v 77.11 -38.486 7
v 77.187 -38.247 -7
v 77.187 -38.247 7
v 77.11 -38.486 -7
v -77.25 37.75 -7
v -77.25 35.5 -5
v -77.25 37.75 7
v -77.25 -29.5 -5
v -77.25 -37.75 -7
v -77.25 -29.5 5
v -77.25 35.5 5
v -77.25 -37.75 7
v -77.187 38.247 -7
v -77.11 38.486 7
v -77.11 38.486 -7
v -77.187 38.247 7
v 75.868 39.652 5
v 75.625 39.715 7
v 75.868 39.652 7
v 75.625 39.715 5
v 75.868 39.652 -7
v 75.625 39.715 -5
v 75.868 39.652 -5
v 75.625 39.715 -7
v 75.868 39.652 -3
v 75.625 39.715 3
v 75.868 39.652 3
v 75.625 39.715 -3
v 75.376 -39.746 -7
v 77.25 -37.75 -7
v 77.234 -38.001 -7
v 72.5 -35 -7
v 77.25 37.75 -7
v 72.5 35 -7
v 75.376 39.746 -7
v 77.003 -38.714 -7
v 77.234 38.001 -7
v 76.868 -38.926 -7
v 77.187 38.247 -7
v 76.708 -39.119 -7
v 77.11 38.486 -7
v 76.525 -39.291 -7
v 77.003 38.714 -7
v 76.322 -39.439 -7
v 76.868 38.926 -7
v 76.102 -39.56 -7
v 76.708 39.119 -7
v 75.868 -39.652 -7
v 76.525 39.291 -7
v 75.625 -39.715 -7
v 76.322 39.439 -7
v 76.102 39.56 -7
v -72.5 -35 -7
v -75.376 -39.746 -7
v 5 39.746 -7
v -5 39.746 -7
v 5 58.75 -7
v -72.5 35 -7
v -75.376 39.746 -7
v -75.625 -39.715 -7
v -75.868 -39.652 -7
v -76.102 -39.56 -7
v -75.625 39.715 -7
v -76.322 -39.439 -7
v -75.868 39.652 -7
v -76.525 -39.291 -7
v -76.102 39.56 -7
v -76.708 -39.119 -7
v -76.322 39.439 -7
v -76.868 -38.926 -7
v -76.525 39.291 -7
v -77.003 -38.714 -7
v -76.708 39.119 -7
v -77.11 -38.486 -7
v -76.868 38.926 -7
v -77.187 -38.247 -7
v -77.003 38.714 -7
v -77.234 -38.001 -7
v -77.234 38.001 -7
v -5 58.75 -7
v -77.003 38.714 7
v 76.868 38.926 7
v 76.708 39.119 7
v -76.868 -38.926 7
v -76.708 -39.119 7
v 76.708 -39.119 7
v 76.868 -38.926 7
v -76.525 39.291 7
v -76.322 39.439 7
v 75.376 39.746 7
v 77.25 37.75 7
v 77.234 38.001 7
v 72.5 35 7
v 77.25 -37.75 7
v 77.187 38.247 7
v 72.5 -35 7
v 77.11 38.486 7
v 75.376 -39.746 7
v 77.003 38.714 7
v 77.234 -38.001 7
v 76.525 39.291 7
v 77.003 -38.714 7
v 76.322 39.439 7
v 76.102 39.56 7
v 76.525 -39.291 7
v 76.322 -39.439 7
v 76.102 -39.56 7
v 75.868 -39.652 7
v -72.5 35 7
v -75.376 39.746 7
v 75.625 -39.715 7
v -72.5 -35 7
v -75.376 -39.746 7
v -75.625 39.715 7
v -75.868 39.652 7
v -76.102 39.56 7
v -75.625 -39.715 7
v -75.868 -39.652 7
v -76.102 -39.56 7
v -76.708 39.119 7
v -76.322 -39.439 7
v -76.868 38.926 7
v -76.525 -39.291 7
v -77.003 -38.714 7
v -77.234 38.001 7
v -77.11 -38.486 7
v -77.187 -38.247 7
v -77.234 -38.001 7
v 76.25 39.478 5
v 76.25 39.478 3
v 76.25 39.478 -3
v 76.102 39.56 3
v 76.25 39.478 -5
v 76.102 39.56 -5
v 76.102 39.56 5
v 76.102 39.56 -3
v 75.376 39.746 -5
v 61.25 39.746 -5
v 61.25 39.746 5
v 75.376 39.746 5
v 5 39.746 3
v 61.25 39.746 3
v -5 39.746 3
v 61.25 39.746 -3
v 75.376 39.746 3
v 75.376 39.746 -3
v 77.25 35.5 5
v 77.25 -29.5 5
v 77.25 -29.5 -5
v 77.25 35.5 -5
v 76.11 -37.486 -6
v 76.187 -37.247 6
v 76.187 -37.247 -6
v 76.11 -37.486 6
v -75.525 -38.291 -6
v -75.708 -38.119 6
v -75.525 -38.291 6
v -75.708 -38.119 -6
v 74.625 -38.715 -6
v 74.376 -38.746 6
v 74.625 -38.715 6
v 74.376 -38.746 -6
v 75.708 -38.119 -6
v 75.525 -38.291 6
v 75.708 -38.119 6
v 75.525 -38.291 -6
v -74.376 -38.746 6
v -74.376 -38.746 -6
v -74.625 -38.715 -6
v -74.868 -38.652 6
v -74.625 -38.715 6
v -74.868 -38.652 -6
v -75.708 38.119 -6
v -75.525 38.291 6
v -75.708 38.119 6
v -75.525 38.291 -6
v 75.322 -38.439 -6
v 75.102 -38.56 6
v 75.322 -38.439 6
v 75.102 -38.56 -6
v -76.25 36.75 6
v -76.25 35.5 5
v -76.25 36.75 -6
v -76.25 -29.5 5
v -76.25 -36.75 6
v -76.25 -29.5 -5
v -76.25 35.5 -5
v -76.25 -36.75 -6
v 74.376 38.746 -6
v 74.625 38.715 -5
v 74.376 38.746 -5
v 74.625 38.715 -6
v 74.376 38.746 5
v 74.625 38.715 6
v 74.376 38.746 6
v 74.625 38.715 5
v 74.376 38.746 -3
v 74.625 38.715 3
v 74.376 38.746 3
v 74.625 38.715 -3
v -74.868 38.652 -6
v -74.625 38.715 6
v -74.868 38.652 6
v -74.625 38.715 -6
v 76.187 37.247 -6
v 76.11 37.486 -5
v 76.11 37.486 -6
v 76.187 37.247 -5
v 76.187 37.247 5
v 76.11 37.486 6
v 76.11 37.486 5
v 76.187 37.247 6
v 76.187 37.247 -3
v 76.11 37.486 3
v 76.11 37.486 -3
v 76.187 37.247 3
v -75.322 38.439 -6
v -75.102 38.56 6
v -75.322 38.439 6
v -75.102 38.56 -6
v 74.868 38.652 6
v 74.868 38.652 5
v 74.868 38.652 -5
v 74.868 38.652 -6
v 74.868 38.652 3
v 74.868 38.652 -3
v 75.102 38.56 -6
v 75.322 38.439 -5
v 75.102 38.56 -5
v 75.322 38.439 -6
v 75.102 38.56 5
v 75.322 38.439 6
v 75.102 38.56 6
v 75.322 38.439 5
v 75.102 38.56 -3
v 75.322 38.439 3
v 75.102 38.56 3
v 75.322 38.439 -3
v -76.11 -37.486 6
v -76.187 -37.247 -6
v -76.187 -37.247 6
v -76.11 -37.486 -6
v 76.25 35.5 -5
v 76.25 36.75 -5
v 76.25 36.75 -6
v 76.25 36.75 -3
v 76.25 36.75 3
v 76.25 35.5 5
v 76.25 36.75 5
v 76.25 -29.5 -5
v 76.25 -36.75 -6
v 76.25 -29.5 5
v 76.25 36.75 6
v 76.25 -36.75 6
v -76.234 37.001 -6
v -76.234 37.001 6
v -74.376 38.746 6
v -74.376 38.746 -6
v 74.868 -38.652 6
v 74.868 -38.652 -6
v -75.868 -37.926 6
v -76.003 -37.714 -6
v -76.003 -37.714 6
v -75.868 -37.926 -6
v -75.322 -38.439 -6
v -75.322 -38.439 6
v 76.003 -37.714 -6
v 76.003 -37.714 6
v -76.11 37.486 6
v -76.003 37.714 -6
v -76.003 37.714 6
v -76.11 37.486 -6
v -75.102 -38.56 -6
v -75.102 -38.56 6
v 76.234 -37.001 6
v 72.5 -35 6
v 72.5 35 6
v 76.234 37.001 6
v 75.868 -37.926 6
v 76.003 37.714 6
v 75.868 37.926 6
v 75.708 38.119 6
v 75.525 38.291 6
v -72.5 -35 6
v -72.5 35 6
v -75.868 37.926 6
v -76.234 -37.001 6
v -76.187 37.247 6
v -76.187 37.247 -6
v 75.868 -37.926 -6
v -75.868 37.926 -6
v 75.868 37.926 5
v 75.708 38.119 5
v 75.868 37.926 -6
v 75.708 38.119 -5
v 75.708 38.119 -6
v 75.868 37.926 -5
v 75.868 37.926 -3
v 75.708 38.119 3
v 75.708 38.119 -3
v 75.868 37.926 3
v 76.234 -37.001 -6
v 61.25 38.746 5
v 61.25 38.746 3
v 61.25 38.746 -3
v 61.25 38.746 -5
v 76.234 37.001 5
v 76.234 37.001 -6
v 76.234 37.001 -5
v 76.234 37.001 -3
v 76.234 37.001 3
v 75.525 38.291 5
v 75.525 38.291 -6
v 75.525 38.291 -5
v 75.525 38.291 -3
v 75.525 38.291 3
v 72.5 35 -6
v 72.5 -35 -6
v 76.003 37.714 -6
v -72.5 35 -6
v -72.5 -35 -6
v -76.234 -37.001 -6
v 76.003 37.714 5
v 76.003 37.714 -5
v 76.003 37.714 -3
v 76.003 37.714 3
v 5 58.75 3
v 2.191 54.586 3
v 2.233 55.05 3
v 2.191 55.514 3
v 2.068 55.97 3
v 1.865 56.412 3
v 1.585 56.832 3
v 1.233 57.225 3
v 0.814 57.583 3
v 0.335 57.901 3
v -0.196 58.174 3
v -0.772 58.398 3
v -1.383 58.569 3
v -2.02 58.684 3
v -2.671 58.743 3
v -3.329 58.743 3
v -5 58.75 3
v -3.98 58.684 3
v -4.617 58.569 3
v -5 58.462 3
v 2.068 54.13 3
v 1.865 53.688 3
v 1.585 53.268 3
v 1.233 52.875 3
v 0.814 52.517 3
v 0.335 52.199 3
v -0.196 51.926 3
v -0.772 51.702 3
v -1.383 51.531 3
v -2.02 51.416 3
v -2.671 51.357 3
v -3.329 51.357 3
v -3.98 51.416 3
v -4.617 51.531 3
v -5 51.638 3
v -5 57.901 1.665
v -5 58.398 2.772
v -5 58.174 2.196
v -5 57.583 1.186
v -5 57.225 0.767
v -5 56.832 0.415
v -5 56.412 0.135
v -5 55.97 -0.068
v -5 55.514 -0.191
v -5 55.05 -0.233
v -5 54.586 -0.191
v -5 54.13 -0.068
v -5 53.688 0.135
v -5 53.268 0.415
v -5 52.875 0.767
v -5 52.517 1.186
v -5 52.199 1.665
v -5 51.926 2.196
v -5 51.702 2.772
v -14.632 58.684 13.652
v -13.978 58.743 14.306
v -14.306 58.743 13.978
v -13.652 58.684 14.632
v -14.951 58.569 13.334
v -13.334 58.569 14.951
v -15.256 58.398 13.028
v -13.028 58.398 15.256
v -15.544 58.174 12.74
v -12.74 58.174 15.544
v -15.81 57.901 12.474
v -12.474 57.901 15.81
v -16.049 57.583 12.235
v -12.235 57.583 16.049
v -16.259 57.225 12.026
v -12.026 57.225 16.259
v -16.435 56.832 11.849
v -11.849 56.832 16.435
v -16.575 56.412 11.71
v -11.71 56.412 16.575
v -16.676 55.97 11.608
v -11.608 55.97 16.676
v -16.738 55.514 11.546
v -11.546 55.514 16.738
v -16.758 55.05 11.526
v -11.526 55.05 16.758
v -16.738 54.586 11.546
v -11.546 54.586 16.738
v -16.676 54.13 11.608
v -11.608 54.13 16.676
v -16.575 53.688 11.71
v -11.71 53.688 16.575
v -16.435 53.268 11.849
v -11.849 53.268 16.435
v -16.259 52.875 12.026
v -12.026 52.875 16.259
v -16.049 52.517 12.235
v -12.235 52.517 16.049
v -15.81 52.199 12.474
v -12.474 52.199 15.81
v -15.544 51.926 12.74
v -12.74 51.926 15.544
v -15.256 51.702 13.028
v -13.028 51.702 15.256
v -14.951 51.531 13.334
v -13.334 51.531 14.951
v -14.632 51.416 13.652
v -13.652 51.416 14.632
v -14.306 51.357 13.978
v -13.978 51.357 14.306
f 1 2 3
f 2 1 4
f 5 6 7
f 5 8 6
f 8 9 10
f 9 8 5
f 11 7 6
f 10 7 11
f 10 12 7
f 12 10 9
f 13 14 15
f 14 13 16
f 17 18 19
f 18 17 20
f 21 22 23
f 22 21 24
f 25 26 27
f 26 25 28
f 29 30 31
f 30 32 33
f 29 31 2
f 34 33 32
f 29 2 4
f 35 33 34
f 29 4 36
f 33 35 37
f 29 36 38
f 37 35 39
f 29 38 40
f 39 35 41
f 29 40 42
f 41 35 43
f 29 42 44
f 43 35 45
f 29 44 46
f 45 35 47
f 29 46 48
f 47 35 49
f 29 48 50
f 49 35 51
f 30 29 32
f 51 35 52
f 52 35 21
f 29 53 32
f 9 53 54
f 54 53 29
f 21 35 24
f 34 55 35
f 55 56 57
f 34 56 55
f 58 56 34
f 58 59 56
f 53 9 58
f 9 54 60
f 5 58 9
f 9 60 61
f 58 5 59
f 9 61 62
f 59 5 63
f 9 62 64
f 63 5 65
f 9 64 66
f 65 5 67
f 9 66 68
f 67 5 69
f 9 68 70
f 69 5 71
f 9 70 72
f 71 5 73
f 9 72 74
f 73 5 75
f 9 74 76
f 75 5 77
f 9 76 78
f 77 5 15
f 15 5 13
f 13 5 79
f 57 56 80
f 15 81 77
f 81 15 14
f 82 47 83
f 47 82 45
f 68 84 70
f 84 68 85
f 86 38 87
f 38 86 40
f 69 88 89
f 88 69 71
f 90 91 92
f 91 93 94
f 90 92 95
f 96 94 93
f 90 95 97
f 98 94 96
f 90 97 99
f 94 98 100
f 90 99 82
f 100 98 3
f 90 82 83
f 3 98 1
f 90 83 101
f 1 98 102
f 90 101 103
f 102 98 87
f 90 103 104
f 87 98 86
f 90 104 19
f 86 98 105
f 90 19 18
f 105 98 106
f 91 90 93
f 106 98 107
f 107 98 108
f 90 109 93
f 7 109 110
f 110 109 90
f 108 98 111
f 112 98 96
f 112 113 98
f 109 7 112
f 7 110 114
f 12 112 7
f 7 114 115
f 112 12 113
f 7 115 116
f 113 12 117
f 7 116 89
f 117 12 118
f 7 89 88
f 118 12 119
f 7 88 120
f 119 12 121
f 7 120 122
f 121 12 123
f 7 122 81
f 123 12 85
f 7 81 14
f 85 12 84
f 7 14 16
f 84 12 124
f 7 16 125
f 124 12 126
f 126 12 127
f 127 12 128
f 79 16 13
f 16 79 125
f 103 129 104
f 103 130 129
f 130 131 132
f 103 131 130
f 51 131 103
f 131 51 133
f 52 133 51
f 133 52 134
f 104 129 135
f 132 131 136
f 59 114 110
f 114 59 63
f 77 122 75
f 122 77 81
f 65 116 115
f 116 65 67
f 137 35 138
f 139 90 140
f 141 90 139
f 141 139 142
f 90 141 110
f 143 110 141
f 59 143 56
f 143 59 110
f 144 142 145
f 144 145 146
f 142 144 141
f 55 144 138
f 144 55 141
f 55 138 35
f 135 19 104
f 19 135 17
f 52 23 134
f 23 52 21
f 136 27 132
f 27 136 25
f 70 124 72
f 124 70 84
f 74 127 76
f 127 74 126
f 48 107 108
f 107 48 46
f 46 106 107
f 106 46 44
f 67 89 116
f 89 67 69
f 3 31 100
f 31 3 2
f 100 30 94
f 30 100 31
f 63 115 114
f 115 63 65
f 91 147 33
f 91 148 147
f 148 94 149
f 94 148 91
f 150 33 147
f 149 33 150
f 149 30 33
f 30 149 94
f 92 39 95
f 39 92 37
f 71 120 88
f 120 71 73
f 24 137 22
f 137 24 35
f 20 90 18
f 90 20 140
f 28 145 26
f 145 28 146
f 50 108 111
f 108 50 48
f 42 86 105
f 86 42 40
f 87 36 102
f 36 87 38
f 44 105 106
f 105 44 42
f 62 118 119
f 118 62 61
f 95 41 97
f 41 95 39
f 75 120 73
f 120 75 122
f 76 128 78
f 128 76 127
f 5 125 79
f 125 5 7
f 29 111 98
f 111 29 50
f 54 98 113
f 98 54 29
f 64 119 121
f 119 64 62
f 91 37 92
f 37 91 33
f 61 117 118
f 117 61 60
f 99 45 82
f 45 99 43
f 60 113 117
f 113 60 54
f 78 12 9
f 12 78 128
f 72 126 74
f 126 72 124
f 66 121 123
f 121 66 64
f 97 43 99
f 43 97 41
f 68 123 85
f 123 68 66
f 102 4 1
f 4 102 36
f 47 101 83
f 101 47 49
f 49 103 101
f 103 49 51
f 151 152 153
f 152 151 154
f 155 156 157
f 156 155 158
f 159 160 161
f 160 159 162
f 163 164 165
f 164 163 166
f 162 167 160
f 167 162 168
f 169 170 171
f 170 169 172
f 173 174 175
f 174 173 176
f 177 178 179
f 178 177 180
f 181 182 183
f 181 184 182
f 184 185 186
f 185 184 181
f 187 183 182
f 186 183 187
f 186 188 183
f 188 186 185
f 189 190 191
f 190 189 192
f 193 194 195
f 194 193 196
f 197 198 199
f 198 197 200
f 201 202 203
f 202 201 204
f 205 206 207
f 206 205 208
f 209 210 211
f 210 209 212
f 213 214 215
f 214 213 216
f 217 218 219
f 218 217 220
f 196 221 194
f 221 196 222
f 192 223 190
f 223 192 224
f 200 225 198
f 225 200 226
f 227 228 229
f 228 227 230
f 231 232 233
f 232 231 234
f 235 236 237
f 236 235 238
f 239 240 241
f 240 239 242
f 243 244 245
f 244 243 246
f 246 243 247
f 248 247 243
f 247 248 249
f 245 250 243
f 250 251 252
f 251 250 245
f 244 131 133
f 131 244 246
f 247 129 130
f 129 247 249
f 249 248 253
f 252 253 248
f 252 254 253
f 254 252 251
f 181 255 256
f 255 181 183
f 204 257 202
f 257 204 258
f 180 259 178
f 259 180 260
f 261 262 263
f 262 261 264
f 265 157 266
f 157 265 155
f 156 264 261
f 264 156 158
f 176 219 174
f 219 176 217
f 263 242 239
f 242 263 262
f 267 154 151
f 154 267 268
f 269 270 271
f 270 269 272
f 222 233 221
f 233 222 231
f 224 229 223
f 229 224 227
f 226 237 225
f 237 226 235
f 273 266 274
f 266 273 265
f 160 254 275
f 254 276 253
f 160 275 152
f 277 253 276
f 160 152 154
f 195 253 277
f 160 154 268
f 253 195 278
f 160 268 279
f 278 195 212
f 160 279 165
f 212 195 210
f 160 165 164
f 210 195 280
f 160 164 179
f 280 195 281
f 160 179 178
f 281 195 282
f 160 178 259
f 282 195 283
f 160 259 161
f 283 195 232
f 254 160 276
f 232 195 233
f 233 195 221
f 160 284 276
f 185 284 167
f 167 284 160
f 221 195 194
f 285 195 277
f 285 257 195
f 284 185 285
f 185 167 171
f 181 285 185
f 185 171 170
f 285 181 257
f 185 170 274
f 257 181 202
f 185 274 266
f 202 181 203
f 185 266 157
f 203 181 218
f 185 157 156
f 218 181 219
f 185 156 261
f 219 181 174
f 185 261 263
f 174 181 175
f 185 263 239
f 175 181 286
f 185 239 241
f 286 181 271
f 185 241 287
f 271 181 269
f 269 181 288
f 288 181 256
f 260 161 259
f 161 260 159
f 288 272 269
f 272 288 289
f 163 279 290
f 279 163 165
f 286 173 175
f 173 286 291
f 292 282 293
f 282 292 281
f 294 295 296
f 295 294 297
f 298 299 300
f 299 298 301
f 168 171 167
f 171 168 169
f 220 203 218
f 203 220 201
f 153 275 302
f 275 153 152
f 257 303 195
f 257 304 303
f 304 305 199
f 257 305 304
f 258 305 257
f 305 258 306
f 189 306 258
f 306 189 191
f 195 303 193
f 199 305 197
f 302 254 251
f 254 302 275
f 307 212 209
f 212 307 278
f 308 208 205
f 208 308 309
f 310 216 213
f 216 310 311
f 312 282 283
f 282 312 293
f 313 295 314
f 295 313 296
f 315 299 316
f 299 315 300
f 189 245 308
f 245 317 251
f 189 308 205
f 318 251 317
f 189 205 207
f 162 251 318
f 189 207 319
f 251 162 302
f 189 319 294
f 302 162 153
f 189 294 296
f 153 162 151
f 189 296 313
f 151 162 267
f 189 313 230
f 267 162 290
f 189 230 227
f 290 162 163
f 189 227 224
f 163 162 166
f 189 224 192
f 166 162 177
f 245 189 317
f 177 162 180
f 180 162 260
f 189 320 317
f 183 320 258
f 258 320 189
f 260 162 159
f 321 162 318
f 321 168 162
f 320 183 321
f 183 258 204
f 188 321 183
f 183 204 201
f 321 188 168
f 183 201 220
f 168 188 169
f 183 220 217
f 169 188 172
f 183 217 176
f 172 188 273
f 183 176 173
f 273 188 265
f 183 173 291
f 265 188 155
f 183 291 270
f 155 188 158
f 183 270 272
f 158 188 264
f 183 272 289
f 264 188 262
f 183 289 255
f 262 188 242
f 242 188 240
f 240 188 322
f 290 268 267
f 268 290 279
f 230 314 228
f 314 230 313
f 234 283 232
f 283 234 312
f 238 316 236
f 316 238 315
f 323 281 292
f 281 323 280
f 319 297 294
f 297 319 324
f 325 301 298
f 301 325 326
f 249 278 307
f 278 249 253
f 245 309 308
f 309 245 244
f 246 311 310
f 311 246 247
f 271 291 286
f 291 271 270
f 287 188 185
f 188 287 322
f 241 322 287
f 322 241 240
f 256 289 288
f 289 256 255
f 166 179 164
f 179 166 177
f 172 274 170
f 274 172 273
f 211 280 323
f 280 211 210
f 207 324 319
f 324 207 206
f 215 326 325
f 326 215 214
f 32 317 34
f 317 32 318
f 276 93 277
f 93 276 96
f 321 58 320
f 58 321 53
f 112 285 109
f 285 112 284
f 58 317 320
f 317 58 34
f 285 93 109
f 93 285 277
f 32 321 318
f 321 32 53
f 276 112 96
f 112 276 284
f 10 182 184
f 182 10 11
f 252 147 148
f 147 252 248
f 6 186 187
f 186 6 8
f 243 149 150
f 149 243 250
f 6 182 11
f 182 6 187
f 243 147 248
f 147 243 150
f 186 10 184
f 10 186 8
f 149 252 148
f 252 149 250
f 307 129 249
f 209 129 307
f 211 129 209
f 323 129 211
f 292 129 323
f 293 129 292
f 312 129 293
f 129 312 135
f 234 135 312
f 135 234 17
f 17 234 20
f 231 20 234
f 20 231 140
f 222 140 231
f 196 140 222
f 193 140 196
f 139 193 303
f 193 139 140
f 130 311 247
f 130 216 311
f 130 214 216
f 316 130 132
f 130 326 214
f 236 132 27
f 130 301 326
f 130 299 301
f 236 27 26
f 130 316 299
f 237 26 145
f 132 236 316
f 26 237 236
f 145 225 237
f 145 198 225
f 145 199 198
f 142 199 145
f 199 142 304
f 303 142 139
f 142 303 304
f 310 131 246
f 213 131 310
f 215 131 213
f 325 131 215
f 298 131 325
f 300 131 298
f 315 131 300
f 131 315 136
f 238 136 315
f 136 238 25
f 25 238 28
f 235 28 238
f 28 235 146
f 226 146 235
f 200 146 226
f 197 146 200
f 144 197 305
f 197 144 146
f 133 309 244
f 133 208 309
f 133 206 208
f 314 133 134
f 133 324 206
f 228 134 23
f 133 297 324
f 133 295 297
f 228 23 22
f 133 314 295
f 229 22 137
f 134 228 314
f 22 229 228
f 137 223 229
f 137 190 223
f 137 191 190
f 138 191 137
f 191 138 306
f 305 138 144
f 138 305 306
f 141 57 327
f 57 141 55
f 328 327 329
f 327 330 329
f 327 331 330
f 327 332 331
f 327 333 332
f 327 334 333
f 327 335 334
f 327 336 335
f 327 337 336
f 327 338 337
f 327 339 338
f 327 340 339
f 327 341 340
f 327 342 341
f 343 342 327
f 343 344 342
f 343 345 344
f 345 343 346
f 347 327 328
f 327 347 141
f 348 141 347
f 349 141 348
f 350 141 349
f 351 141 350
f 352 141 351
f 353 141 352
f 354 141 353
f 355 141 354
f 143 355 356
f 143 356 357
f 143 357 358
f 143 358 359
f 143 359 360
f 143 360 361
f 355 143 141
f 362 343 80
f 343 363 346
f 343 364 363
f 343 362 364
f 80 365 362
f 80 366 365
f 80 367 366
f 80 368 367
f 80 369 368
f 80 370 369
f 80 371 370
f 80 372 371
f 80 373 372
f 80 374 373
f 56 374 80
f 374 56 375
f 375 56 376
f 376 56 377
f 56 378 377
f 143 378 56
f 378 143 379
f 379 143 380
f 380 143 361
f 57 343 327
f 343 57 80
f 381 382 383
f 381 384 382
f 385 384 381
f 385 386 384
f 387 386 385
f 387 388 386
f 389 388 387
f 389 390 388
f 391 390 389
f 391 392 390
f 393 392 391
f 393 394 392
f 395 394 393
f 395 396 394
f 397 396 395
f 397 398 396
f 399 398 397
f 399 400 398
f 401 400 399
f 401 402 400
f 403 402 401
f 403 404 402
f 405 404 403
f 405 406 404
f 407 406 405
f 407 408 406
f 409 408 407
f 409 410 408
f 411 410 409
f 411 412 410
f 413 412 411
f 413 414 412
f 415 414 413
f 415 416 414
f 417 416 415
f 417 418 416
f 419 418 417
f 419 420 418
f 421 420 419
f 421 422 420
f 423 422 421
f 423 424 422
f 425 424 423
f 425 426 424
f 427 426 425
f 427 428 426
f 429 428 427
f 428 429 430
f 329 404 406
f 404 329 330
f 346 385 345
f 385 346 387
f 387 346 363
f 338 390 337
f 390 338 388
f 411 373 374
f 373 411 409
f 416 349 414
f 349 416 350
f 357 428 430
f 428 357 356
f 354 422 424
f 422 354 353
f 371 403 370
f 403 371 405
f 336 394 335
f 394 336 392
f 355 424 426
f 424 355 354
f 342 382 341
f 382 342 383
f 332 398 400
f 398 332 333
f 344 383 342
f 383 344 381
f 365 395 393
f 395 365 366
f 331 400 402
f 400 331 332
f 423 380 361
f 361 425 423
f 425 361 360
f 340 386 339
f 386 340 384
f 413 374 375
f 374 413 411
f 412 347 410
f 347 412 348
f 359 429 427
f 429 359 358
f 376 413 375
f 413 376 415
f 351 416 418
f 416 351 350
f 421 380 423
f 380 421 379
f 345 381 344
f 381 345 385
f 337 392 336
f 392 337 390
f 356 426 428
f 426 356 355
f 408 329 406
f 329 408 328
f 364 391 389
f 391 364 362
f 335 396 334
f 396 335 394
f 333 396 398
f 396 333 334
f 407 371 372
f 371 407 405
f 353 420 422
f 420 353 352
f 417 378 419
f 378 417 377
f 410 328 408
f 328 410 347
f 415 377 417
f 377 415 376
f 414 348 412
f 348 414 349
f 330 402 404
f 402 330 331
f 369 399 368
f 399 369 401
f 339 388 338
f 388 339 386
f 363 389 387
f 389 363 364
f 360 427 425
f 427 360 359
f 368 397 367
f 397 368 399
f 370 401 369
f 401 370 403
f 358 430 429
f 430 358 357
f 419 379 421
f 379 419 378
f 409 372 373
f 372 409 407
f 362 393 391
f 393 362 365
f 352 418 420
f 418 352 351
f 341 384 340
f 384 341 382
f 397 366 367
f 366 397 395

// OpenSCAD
// file: ../../lib/utils.scad
// Cube with rounded corners
// roundedCornerCube (50,50,4);
module roundedCornerCube(length, width, thickness){

        hull()
        {
            translate([length/2 - 2, width/2 - 2, 0]) cylinder(r=2, h=thickness, $fn=50, center=true);
            translate([length/2 - 2, -width/2 + 2, 0]) cylinder(r=2, h=thickness, $fn=50, center=true);
            translate([-length/2 + 2, width/2 - 2, 0]) cylinder(r=2, h=thickness, $fn=50, center=true);
            translate([-length/2 + 2, -width/2 + 2, 0]) cylinder(r=2, h=thickness, $fn=50, center=true);
        }

}

// Hollow cube with rounded corners. Will look like a frame with rounded con
// hollowRoundedCornerCube(50,70,4,2);
module hollowRoundedCornerCube(length, width, thickness, wallthickness)
{
    difference()
    {
        roundedCornerCube(length,width,thickness);
        roundedCornerCube(length-(wallthickness*2),width-(wallthickness*2),thickness);
    }
}

/*
module cylinderWithHandle(radius, thickness)
{
    rotate_extrude($fn=100)
        polygon( points = [[0,0], [radius,0], [radius,thickness] , [1,thickness], [2,thickness + 2] , [2,thickness + 6],[0,thickness + 6]] );
}
*/


// hollow cylinder
// hollowCylinder(radius, height, wallThickness)
// radius : radius to outter wall
// wallThickness : Thickness of wall
module hollowCylinder(radius, height, wallThickness)
{

    difference()
    {
        cylinder(h=height, r1=radius, r2=radius);
        translate([0,0,-.02]) cylinder(h=height + .04, r1=radius - wallThickness, r2=radius - wallThickness);
    }
}


// hollow cylinders
// hollowCylinders(20, 10, 2, 2, 2)
// radius : radius to outer wall
// gapsSize : size of gap between each rings
// minradius : radius of the smallest ring
module hollowCylinders(radius, height, wallThickness, gapSize, minRadius)
{
    for (i = [radius : -(gapSize + wallThickness) : minRadius])
    {
       //echo (i);
       hollowCylinder(i,height,wallThickness);
    }
}

//
// b = bottom diameter
// t = top diameter
// h = height
module cone(b, t, h)
{
    cylinder(h=h, r1=b/2, r2=t/2, $fn=100);
}

// hollowCone(10,4,20, 2)
module hollowCone(bottomRadius, topRadius, height, wallThickness)
{
    difference()
    {
        cylinder(h=height, r1=bottomRadius, r2=topRadius, $fn=100);
        translate([0,0,-.02]) cylinder(h=height, r1=bottomRadius - wallThickness, r2=topRadius - wallThickness, $fn=100);
    }
}


// w = width between flat surface
// h = height
module hex (w=10, h=2){
  cylinder (r=w/2, h=h, center=true, $fn=6);
}

// hollowCone(10,4,20, 2)
module hollowHex(w=10, h=2, th=2)
{
    difference()
    {
        cylinder (r=w/2, h=h, center=true, $fn=6);
        cylinder (r=w/2 - th, h=h, center=true, $fn=6);
    }
}

// h : height
// ns : number of sides for base
// br : bottom radius
// tr : top radius
// ro : rotation in degree between bottom and top
// sl : slice layer. high value give smooth appearence
module twistExtrude(h=50,ns=6,br=20,tr=20,ro=100,sl=5)
{

	linear_extrude(height = h, twist  = ro,	slices = sl, scale  = tr/br)
		circle(r=br, $fn=ns);
}


// h : height
// ns : number of sides for base
// br : bottom radius
// tr : top radius
// ro : rotation in degree between bottom and top
// sl : slice layer. high value give smooth appearence
// wt : wall thickness
module hollowTwistExtrude(h=50,ns=6,br=20,tr=20,ro=100,sl=5,wt=1)
{
	difference()
	{
		linear_extrude(height = h, twist  = ro,	slices = sl, scale  = tr/br)
			circle(r=br, $fn=ns);

    translate([0,0,-.01])
		linear_extrude(height = h + .1, twist  = ro,	slices = sl, scale  = tr/br)
			circle(r=br - wt, $fn=ns);
	}
}


///////////////////////////////////////////////////////////////////////////////////////////////////////////////////

// honeycomb tiles
// honeycombSquare(100,100,4,10,2);
module honeycombTiles(length, width,thickness,rad,wallThickness)
{
    //thickness = 4;
    //rad = 10;
    //wallThickness = 2;
    //length = 100;
    //width = 100;

    for (w=[0: width/rad])
    {

        if (w % 2 == 0)
        {
            //cylinder($fn=6, r=rad, h=2);
            for (i = [0 : length/((rad*2) + (wallThickness*2))])
            {
              translate([rad*(3*i) + (wallThickness*2)*i,w*rad,0]) cylinder($fn=6, r=rad, h=thickness);

              //translate([rad*6 + (wallThickness*2)*2,0,0]) cylinder($fn=6, r=10, h=2);
              //translate([rad*9 + (wallThickness*2)*3,0,0]) cylinder($fn=6, r=10, h=2);
            }
        }

        if (w % 2 == 1)
        {
            for (j = [1 : 2 : (length/(rad + wallThickness))])
            {
              translate([(rad*1.5) *j + wallThickness *j , (w*rad) + wallThickness/2 ,0])  cylinder($fn=6, r=rad, h=thickness);
                //translate([(rad*1.5) *3 + wallThickness *3 ,10,0]) circle($fn=6, r=10);
                //translate([(rad*1.5) *5 + wallThickness *5 ,10,0]) circle($fn=6, r=10);
            }
        }
    }
}

// honeycomb square
// A square area with hollow honeycomb design
// honeycombSquare(100,100,4,10,2);
module honeycombSquare(length, width, thickness, cellRad,wallThickness)
{
    difference()
    {
        cube([length,width,thickness], center=true);
        translate([-length/2,-width/2, -thickness/2]) honeycombTiles(length,width,thickness,cellRad,wallThickness);
    }
}

//honeycomb(length, width, height, cell_size, wall_thickness);
//honeycomb(50, 50, 4, 10, 1);
//hollowRoundedCornerCube(50,70,4,2);

//hollowCylinder(10,20,2);

//hollowCylinders(20, 10, 2, 2, 2);
//cone(10,2,20);

// hollowCone(10,4,20, 2);

// honeycombSquare(40,40,2,5,2);


module edgeClamp(l=10)
{
   difference()
   {
    translate([0,.6,0]) rotate([45,0,0]) cube([l,2,2], center=true);
    translate([0,.6,1.5]) cube([l + .1,1,1], center=true);
    translate([0,.6,-1.5]) cube([l + .1,1,1], center=true);
   }
   cube([l,2,2], center=true);
}

cube([10,2,2], center=true);
translate([0,0,2]) edgeClamp();
// main file
use <../../lib/utils.scad>



l = 60;
w = 70; // width of the base (l x w = area of the base) 70
h = 50; // Height of the back support 
th = 1; // thickness

er = 7; // inner radius of the curved edge in front

module body()
{
 
    // front curved edge
    difference()
    {
    translate([0, l/2,er+th/2])
        difference()
        {
            rotate([90,0,0]) cylinder(h=l, r1=er+(th/2), r2=er+(th/2), $fn=100);
            translate([0,.02,0]) rotate([90,0,0]) cylinder(h=l + 1, r1=er-th/2, r2=er-th/2, $fn=100);

        }
        translate([th,0,er*2 - th*2]) rotate([0,110,0]) cube([er+th*2,l+2,3*er+(th*2)], center=true);
        translate([5,0,5]) cube([10,l + 2,10] ,  center=true);
        
   }

    // high back
    translate([sin(20)*(h/2) + er/2 + th + th/2,0,cos(20)*(h/2) + th/2]) rotate([0,110,0]) roundedCornerCube(h, l, th); 
}

// Tip over back support
module support()
{
    difference()
    {

        translate([7,0,0]) hollowCone(l/2, 4, 1.5*h, th);
        //translate([sin(20)*(h/2) + er/2 + th + th/2,0,cos(20)*(h/2) + th/2]) rotate([0,110,0]) roundedCornerCube(h, l, th);
        #translate([(sin(20)*(h/2))- (h/2 * cos(20)) + th + th,0,(cos(20)*(h/2))]) rotate([0,20,0]) cube([h,l,4*h], center=true);
    }
}

union ()
{
    //body();
    //support();
    //roundedCornerCube(152.5, 12, 77.5);
}

module phone()
{
    rotate([90,0,0]) roundedCornerCube(152.5, 77.5, 12);
}

// phone();
/*
translate([0,0,15])
union()
{
    difference()
    {
        cube([14 + 2,10,30] , center=true);
        translate([0,0,1]) cube([14 ,10 + 1,30] , center=true);
    }

    translate([-(14/2) - 2,0,-(15/2)])
    rotate([180,0,0])
    difference()
    {
        cube([2 + 2,10,15] , center=true);
        translate([0,0,1]) cube([2 ,10 + 1,15] , center=true);
    }
}
*/

difference()
{
    roundedCornerCube(152.5 + 2, 77.5 + 2, 12 + 2);
    roundedCornerCube(152.5, 77.5, 12);
    
    cube([145,70,15], center=true);
    translate([0,3,0]) cube([160,65,10], center=true);
    
   translate([152.5/2 - 15/2,77.5/2,12/2 - 2]) cube([15,10,2], center=true);
   translate([152.5/2 - 15/2,77.5/2, -12/2 + 2]) cube([15,10,2], center=true);
}

translate([0,77.5/2+ 20/2, - 12/2 + 10/2 - 1]) cube([10,20,10],center=true);
translate([0,77.5/2 + 20 - 3.7,0]) rotate([0,-45,0]) cylinder(r1=3.7,r2=3.7,h=20,$fn=50);
